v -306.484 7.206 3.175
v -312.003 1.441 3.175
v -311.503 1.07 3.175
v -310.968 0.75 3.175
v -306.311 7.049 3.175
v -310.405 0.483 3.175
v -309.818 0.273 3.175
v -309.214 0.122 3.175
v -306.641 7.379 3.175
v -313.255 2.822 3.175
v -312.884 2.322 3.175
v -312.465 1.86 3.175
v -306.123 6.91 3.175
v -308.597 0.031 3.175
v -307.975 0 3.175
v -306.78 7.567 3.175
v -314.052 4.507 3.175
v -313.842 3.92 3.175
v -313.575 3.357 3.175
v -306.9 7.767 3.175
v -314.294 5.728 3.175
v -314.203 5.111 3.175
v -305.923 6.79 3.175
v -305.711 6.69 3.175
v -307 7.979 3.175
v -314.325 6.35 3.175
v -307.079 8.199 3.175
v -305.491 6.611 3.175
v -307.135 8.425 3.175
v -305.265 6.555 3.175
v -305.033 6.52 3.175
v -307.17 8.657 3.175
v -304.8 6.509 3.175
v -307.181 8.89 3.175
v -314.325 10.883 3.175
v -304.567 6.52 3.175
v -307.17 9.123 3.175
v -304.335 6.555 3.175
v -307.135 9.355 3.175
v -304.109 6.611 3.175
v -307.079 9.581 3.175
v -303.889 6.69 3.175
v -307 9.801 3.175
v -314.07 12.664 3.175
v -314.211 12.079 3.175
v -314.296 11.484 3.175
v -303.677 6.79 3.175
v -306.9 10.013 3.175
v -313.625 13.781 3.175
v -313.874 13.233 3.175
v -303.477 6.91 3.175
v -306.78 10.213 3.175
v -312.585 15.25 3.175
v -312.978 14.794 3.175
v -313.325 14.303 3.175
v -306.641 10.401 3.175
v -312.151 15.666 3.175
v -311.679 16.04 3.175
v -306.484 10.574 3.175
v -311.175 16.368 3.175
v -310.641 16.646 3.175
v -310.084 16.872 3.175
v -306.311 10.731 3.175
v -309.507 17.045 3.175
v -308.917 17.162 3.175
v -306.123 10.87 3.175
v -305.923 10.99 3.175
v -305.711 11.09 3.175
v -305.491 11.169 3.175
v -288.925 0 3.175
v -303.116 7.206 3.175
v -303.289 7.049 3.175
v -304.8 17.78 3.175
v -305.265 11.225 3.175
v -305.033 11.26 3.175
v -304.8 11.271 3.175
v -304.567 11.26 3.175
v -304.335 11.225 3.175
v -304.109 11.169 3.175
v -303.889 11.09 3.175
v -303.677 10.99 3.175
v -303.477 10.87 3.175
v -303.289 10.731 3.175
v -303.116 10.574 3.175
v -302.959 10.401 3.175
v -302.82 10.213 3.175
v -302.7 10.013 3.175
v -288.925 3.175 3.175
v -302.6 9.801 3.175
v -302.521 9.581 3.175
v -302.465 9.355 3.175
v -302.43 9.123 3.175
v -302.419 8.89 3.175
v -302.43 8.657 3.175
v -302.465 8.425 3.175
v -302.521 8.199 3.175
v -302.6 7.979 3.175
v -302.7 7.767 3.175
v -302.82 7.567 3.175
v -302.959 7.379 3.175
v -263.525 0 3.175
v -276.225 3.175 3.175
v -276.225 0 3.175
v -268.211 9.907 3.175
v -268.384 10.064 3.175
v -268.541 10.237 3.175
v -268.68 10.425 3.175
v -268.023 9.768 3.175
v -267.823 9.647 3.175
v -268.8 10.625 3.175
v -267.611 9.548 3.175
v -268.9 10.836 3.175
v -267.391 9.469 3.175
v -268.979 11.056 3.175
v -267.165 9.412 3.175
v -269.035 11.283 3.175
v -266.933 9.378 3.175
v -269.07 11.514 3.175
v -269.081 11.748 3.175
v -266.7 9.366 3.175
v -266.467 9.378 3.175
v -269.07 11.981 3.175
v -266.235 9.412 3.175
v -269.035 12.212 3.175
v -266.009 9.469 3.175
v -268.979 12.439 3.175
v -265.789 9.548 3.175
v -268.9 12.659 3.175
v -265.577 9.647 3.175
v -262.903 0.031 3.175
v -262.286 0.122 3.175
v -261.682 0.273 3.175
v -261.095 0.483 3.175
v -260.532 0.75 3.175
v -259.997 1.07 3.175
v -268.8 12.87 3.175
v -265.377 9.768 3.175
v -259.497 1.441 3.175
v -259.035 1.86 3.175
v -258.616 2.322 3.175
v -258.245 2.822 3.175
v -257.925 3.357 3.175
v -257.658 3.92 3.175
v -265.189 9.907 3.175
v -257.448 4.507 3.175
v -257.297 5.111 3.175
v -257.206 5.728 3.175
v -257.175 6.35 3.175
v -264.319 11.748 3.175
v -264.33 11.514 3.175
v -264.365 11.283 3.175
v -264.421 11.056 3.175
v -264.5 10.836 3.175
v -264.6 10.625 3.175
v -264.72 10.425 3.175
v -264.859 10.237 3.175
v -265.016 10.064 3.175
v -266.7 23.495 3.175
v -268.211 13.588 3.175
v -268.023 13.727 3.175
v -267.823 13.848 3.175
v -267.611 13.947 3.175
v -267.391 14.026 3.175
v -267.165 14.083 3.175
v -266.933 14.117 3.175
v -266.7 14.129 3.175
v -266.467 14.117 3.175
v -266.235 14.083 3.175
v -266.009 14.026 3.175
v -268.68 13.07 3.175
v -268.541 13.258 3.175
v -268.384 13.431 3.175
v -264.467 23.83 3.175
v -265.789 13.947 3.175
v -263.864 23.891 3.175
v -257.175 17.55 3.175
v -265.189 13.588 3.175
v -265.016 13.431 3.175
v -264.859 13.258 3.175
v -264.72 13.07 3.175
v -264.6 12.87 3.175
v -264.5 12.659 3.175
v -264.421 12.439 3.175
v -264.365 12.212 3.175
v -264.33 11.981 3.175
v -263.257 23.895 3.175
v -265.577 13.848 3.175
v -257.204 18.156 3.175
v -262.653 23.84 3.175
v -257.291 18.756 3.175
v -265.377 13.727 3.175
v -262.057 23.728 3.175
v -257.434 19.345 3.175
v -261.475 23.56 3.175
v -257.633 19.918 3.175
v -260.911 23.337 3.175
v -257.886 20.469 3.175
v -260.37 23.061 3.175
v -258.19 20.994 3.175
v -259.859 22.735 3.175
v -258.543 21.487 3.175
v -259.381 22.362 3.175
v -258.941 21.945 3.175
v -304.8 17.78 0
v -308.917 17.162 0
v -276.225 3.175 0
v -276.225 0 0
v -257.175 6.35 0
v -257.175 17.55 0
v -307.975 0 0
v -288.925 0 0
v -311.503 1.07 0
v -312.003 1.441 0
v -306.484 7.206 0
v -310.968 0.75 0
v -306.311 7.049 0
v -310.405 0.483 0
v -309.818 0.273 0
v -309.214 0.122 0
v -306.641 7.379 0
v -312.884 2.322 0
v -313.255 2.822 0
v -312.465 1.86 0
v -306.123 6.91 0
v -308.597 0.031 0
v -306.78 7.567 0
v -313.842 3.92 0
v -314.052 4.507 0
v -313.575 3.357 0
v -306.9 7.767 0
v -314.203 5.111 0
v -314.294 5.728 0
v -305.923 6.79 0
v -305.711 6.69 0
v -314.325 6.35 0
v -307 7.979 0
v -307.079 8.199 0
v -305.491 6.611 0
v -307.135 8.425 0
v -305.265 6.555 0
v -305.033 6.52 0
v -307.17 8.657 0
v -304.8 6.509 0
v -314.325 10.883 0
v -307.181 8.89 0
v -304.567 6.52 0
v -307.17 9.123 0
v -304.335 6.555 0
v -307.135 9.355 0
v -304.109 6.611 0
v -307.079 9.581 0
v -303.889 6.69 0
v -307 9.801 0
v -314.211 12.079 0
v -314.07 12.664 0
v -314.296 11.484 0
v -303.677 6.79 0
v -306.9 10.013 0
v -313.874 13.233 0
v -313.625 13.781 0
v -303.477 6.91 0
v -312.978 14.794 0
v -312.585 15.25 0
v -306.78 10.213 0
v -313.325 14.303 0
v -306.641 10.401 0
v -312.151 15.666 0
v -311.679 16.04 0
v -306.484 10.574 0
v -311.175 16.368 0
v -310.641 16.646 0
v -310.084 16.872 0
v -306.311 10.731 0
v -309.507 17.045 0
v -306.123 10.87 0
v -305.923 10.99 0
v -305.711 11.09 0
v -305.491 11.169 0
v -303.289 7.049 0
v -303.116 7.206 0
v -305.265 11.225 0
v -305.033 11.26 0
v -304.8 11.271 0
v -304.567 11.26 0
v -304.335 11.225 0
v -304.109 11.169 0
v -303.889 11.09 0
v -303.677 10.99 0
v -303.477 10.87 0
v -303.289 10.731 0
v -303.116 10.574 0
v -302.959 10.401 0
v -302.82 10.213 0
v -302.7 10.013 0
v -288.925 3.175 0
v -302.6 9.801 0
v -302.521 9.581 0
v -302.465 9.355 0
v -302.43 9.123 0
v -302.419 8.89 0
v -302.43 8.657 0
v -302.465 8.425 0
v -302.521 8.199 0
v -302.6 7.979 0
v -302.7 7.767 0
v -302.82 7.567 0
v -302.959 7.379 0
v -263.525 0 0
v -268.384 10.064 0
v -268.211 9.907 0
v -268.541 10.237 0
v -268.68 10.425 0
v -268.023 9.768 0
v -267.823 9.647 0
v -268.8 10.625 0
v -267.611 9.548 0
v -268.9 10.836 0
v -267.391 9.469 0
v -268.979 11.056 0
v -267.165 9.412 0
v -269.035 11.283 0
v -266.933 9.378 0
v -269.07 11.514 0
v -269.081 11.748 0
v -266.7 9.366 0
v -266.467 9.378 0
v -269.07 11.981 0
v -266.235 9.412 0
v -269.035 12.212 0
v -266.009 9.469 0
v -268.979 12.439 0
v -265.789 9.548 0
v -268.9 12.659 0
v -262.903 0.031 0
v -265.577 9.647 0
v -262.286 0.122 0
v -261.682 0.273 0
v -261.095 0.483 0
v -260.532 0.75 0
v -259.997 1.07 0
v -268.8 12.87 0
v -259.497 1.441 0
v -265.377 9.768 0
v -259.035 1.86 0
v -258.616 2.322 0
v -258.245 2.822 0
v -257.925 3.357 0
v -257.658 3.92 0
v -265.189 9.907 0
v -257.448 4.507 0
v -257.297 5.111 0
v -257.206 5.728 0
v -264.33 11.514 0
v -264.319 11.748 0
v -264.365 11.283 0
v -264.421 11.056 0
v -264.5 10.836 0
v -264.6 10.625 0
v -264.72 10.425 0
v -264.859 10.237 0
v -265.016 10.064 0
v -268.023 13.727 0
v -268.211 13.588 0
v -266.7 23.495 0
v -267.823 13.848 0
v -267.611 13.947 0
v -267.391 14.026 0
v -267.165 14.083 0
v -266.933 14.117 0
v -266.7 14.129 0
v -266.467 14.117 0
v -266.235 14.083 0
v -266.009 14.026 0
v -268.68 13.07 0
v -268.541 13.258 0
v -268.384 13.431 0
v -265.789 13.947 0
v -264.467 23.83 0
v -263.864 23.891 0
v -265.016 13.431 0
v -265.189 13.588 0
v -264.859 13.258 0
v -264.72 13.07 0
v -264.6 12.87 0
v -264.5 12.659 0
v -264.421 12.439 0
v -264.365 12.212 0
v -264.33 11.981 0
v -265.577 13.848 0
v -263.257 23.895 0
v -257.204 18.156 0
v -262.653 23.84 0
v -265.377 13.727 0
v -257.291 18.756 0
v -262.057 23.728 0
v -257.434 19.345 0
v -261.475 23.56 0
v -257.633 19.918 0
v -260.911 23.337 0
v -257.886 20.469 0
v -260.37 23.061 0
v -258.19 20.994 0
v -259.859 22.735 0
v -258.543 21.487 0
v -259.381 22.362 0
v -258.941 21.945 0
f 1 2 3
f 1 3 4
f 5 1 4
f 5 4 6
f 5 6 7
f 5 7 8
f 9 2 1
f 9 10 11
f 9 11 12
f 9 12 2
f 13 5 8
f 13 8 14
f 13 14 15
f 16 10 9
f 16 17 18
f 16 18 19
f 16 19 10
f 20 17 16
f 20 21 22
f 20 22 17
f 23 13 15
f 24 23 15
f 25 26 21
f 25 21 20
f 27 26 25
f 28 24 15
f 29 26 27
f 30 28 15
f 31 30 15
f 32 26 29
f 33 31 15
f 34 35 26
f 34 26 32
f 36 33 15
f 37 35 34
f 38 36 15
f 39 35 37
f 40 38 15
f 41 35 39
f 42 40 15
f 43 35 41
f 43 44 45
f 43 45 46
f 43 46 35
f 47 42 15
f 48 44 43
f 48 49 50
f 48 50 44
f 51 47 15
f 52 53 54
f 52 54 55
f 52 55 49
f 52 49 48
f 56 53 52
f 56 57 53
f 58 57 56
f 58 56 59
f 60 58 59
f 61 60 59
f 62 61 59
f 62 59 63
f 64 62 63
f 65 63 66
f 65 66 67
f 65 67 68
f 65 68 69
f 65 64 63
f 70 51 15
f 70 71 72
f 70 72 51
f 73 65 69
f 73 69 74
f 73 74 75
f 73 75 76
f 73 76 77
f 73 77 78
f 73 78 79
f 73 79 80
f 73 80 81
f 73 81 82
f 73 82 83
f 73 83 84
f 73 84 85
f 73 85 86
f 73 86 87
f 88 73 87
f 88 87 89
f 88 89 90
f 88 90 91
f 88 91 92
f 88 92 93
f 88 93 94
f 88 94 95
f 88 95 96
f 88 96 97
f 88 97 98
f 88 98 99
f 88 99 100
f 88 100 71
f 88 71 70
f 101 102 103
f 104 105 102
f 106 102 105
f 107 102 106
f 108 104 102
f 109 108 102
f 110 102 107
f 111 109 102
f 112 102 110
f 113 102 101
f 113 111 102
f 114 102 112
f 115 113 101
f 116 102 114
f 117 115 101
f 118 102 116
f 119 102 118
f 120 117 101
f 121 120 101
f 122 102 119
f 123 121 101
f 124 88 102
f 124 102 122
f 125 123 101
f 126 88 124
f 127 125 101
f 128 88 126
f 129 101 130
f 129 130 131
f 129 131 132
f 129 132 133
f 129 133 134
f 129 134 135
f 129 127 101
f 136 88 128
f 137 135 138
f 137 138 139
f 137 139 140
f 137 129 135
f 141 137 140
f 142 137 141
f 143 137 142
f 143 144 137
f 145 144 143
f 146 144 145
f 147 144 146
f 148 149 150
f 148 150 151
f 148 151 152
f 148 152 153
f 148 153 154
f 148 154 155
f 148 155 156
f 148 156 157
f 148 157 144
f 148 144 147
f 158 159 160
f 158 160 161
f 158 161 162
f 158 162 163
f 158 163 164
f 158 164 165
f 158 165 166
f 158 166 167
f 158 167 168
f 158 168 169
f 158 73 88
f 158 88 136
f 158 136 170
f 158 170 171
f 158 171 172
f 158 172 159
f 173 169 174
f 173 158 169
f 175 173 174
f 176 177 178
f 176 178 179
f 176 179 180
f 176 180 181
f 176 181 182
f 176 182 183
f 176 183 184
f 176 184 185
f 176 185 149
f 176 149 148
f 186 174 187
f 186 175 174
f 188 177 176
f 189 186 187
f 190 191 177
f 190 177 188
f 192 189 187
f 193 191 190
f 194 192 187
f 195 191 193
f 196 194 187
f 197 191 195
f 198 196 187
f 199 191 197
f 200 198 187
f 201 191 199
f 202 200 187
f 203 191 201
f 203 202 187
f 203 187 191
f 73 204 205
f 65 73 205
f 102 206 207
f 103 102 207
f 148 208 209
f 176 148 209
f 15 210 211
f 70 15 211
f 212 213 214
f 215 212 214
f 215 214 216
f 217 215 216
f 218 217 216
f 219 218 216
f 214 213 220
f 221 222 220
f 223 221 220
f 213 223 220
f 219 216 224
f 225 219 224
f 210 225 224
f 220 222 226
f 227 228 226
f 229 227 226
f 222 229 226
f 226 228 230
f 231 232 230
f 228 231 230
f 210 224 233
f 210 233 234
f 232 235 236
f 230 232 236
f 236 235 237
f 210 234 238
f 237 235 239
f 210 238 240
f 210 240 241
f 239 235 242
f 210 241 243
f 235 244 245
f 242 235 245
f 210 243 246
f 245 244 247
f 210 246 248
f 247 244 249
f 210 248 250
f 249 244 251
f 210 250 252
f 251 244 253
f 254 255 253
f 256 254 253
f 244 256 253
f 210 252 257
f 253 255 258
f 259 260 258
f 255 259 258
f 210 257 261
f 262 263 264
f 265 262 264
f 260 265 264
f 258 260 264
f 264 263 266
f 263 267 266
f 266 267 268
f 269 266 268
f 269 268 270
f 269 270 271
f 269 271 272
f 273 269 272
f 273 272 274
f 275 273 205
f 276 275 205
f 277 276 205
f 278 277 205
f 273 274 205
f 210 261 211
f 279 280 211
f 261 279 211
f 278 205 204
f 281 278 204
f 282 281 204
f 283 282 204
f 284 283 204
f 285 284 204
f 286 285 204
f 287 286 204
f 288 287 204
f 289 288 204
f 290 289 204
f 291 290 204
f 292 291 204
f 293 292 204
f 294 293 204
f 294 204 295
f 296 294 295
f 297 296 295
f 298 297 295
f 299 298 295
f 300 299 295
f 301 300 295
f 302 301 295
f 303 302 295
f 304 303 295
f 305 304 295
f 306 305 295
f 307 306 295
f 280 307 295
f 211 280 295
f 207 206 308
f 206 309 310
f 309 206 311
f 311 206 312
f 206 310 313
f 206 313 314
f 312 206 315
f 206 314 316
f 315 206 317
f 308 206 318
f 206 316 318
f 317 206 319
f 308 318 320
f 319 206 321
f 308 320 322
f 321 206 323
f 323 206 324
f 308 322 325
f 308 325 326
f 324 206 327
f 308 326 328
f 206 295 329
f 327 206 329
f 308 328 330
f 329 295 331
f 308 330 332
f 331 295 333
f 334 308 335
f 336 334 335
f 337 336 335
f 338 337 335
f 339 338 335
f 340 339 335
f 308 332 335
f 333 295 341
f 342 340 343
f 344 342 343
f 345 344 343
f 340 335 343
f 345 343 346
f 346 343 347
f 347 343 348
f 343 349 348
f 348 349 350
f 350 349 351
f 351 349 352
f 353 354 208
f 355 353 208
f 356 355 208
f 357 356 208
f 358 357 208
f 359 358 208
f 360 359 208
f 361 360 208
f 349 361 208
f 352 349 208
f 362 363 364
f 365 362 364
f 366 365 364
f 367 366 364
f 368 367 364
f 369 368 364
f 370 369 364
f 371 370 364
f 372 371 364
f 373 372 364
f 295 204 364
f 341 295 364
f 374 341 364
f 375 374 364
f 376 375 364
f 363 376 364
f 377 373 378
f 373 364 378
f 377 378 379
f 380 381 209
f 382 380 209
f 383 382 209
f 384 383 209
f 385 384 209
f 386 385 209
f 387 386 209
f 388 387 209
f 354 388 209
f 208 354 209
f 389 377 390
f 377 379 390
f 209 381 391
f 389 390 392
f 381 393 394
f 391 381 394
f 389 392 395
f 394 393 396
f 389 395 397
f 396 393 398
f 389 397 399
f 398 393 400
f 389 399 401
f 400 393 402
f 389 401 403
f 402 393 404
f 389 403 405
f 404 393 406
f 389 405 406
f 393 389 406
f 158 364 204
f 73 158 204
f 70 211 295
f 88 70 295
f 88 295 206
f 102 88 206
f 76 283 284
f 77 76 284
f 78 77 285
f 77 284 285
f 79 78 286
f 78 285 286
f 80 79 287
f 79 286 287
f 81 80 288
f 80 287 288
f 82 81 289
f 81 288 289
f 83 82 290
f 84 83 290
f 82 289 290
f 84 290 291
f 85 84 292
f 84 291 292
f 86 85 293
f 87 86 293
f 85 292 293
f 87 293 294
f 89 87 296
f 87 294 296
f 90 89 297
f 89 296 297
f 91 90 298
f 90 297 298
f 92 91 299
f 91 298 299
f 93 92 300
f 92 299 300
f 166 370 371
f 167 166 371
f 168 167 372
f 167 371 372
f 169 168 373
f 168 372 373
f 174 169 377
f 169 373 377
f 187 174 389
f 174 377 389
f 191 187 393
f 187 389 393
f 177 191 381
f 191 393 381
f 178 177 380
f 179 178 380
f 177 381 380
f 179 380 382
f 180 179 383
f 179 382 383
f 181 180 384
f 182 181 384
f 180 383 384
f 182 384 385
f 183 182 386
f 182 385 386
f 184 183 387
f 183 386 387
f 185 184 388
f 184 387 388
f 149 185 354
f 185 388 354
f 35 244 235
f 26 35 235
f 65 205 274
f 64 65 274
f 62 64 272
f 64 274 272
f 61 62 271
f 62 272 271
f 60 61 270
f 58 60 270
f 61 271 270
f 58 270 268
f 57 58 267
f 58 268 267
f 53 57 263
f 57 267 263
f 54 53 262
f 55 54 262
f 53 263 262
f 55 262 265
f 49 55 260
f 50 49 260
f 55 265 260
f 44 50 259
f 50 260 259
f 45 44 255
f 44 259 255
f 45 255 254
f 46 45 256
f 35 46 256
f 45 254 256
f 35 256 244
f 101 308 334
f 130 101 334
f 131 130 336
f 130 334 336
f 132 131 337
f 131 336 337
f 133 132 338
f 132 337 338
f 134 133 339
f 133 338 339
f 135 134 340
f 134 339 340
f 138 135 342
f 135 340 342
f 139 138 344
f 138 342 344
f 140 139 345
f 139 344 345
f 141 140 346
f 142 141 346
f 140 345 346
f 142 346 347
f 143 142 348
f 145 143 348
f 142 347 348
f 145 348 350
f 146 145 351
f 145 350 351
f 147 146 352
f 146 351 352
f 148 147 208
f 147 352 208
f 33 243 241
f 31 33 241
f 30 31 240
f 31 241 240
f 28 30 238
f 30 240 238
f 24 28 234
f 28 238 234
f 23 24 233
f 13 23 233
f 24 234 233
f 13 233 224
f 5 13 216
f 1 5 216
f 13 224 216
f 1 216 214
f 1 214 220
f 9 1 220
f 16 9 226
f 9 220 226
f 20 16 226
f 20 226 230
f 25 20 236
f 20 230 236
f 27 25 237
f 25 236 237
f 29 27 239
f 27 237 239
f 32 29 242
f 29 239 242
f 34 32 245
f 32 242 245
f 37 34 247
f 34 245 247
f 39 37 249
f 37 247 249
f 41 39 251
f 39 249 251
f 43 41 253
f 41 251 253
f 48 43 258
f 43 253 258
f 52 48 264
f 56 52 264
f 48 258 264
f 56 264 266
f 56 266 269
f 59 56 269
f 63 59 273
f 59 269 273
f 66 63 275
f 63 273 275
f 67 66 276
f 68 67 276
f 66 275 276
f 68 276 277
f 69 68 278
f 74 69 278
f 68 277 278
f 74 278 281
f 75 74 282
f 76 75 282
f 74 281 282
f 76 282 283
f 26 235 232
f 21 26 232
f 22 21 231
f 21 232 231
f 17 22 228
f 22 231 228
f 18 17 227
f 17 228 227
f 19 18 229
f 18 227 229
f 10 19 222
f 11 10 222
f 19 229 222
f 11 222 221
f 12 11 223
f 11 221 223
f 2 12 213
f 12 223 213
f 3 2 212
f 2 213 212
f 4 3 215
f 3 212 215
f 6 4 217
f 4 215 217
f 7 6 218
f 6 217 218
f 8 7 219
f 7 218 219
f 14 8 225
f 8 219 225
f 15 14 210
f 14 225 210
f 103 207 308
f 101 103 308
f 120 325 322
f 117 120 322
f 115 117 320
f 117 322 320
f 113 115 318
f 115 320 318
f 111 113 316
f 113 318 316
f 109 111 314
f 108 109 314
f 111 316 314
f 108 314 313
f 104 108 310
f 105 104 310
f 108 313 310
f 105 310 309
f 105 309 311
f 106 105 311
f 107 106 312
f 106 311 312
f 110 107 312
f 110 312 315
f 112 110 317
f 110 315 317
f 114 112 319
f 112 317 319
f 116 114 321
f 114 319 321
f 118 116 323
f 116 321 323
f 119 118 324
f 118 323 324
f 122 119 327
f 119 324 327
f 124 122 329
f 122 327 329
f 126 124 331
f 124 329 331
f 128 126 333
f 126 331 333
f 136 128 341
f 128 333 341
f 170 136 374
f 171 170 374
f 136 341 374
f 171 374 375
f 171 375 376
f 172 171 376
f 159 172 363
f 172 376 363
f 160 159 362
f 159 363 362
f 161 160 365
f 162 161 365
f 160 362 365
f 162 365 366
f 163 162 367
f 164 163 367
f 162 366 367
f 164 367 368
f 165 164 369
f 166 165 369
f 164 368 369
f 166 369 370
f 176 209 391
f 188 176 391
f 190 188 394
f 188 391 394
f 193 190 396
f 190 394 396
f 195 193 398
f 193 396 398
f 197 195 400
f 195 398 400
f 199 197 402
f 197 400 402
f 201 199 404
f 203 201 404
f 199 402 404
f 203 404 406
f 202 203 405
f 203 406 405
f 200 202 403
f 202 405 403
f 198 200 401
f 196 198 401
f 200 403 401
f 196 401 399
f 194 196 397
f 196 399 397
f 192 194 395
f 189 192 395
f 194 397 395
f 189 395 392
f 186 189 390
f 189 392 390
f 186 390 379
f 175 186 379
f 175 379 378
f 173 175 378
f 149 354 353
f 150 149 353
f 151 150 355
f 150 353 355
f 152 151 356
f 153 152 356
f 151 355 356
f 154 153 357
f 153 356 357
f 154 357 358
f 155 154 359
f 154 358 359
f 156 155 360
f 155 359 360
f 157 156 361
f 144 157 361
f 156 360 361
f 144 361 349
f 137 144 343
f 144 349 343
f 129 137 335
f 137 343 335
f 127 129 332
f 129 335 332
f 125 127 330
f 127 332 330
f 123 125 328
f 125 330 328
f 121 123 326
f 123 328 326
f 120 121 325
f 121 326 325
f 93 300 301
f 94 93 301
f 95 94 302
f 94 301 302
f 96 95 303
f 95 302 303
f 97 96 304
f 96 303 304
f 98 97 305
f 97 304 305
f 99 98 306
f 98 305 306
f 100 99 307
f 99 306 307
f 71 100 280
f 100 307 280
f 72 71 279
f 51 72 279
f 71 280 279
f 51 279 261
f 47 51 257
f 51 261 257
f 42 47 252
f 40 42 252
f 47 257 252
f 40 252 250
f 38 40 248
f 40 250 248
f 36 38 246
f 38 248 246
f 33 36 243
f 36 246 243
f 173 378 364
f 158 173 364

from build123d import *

# Parameters (mm, degrees)
BOSS_EXTRUDE1_DEPTH = 3.175


with BuildPart() as part:
    # Sketch1 → Boss-Extrude1 (new body)
    with BuildSketch(Plane.XY):
        with BuildLine():
            Line((-307.975, 0), (-304.8, 0))
            Line((-304.8, 0), (-304.8, 6.50875))
            ThreePointArc((-304.8, 6.50875), (-307.18125, 8.89), (-304.8, 11.27125))
            Line((-304.8, 11.27125), (-304.8, 17.78))
            Line((-304.8, 17.78), (-308.916961876, 17.162455719))
            ThreePointArc((-308.916961876, 17.162455719), (-312.786650336, 15.026442621), (-314.325, 10.882709878))
            Line((-314.325, 10.882709878), (-314.325, 6.35))
            ThreePointArc((-314.325, 6.35), (-312.465128061, 1.859871939), (-307.975, 0))
        make_face()
        with BuildLine():
            Line((-304.8, 0), (-288.925, 0))
            Line((-288.925, 0), (-288.925, 3.175))
            Line((-288.925, 3.175), (-276.225, 3.175))
            Line((-276.225, 3.175), (-276.225, 0))
            Line((-276.225, 0), (-266.7, 0))
            Line((-266.7, 0), (-266.7, 9.36625))
            ThreePointArc((-266.7, 9.36625), (-269.08125, 11.7475), (-266.7, 14.12875))
            Line((-266.7, 14.12875), (-266.7, 23.495))
            Line((-266.7, 23.495), (-304.8, 17.78))
            Line((-304.8, 17.78), (-304.8, 11.27125))
            ThreePointArc((-304.8, 11.27125), (-303.116201977, 10.573798023), (-302.41875, 8.89))
            ThreePointArc((-302.41875, 8.89), (-303.116201977, 7.206201977), (-304.8, 6.50875))
            Line((-304.8, 6.50875), (-304.8, 0))
        make_face()
        with BuildLine():
            Line((-266.7, 9.36625), (-266.7, 0))
            Line((-266.7, 0), (-263.525, 0))
            ThreePointArc((-263.525, 0), (-259.034871939, 1.859871939), (-257.175, 6.35))
            Line((-257.175, 6.35), (-257.175, 17.550209878))
            ThreePointArc((-257.175, 17.550209878), (-259.381267257, 22.361860214), (-264.466961876, 23.829955719))
            Line((-264.466961876, 23.829955719), (-266.7, 23.495))
            Line((-266.7, 23.495), (-266.7, 14.12875))
            ThreePointArc((-266.7, 14.12875), (-265.016201977, 13.431298023), (-264.31875, 11.7475))
            ThreePointArc((-264.31875, 11.7475), (-265.016201977, 10.063701977), (-266.7, 9.36625))
        make_face()
    extrude(amount=BOSS_EXTRUDE1_DEPTH)


solid = part.part
